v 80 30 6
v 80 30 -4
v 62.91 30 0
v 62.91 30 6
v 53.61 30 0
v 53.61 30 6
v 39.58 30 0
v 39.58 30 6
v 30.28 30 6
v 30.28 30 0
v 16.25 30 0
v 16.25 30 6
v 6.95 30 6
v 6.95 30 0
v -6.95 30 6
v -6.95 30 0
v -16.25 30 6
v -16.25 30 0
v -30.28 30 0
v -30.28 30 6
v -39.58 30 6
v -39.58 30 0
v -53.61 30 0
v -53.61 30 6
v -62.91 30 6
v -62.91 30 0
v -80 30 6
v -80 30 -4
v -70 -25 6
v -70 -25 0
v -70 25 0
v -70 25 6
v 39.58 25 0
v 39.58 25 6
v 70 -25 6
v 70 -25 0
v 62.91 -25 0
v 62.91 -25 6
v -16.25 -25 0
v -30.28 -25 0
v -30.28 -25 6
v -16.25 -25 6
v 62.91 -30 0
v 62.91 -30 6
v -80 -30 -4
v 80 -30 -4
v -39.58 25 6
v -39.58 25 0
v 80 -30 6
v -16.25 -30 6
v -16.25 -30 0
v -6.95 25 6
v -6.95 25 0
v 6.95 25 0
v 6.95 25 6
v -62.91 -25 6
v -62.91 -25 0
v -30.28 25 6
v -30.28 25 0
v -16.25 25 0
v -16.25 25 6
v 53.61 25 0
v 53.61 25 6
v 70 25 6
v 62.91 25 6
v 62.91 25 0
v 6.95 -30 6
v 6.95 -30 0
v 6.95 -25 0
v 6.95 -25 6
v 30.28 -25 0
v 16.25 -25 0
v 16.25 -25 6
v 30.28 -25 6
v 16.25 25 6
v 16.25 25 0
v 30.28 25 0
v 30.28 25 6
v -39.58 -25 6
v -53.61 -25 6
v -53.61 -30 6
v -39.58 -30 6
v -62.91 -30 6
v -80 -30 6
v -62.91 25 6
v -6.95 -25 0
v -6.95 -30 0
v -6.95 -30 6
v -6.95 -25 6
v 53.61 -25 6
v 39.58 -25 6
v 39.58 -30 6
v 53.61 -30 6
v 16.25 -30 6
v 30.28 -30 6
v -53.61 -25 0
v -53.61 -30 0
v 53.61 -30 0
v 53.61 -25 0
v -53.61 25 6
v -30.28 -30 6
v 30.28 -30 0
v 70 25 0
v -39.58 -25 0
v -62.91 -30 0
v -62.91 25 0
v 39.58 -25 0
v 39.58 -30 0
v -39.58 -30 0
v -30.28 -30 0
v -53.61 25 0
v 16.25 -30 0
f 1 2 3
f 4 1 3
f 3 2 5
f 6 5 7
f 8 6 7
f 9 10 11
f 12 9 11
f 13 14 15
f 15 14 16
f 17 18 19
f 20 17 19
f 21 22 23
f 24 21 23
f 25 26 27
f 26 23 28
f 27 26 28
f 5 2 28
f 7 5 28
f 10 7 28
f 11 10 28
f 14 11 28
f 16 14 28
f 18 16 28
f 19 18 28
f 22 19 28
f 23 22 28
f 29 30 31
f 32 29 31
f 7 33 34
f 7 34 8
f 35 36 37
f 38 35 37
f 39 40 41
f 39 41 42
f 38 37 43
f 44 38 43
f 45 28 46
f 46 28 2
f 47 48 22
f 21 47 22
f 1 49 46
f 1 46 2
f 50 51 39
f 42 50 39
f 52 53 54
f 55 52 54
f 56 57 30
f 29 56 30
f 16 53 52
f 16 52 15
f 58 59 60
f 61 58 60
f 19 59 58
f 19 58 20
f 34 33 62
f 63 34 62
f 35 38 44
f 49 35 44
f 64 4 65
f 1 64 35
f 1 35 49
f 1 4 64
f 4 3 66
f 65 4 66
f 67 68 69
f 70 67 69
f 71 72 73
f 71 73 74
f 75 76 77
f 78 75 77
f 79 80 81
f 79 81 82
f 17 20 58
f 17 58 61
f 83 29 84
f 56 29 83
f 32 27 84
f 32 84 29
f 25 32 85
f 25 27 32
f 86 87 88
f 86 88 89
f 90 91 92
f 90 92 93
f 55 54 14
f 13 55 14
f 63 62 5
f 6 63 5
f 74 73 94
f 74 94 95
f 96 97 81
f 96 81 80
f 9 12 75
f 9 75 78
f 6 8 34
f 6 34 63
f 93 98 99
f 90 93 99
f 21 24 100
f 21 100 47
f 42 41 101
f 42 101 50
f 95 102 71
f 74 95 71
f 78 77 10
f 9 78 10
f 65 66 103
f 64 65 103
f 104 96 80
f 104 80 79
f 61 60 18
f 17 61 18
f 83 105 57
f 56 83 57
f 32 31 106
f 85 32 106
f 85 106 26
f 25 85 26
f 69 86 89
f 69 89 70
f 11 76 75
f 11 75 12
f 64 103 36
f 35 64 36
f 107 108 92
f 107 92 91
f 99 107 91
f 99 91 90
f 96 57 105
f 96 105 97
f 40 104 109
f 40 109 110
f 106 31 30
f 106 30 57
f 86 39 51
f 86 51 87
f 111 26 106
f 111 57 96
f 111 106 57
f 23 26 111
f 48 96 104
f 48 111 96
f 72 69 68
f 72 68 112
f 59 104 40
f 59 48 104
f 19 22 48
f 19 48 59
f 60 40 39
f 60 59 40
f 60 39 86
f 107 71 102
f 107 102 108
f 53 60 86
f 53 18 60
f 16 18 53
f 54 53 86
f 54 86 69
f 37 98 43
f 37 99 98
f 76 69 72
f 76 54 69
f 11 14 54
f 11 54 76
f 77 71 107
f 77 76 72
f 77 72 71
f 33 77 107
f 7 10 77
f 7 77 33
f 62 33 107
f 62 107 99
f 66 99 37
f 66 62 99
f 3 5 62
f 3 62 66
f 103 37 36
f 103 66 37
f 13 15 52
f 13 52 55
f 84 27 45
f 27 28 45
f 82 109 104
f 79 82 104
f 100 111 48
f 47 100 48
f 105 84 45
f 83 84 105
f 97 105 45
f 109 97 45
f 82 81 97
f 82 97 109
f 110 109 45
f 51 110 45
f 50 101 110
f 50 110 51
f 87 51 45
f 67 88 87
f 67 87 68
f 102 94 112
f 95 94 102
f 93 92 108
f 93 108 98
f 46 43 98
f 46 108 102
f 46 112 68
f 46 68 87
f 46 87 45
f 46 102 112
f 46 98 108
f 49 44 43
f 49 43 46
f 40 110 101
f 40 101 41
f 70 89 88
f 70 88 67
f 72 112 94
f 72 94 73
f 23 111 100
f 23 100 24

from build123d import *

# Parameters (mm, degrees)
F0_W     = 14.03
F0_H     = 5
F0_W_2   = 13.9
F0_H_2   = 25
F0_W_3   = 9.3
F0_W_4   = 7.09
F0_H_3   = 50
F1_DEPTH = 4
F2_DEPTH = 6


with BuildPart() as f1:
    # F0 (on Top) → F1 (new body)
    with BuildSketch(Plane.XY):
        with Locations((-23.265, 27.5)):
            Rectangle(F0_W, F0_H)
        with Locations((0, -27.5)):
            Rectangle(F0_W_2, F0_H)
        with Locations((46.595, -27.5)):
            Rectangle(F0_W, F0_H)
        Polygon((-62.91, 25), (-62.91, 30), (-80, 30), (-80, -30), (-62.91, -30), (-62.91, -25), (-70, -25), (-70, 25), align=None)
        with Locations((23.265, -12.5)):
            Rectangle(F0_W, F0_H_2)
        with Locations((58.26, -27.5)):
            Rectangle(F0_W_3, F0_H)
        with Locations((34.93, 27.5)):
            Rectangle(F0_W_3, F0_H)
        with Locations((-11.6, -27.5)):
            Rectangle(F0_W_3, F0_H)
        with Locations((-66.455, 0)):
            Rectangle(F0_W_4, F0_H_3)
        with Locations((23.265, 27.5)):
            Rectangle(F0_W, F0_H)
        with Locations((66.455, 0)):
            Rectangle(F0_W_4, F0_H_3)
        with Locations((-58.26, 27.5)):
            Rectangle(F0_W_3, F0_H)
        with Locations((46.595, 27.5)):
            Rectangle(F0_W, F0_H)
        with Locations((-46.595, 27.5)):
            Rectangle(F0_W, F0_H)
        Polygon((80, -30), (80, 30), (62.91, 30), (62.91, 25), (70, 25), (70, -25), (62.91, -25), (62.91, -30), align=None)
        with Locations((-34.93, 27.5)):
            Rectangle(F0_W_3, F0_H)
        with Locations((58.26, 27.5)):
            Rectangle(F0_W_3, F0_H)
        with Locations((11.6, 27.5)):
            Rectangle(F0_W_3, F0_H)
        with Locations((0, 27.5)):
            Rectangle(F0_W_2, F0_H)
        with Locations((-23.265, -27.5)):
            Rectangle(F0_W, F0_H)
        with Locations((-11.6, 27.5)):
            Rectangle(F0_W_3, F0_H)
        with Locations((23.265, -27.5)):
            Rectangle(F0_W, F0_H)
        with Locations((-34.93, -27.5)):
            Rectangle(F0_W_3, F0_H)
        with Locations((-46.595, 0)):
            Rectangle(F0_W, F0_H_3)
        with Locations((23.265, 12.5)):
            Rectangle(F0_W, F0_H_2)
        Polygon((6.95, 0), (6.95, 25), (-6.95, 25), (-6.95, -25), (6.95, -25), align=None)
        with Locations((34.93, -27.5)):
            Rectangle(F0_W_3, F0_H)
        with Locations((-46.595, -27.5)):
            Rectangle(F0_W, F0_H)
        with Locations((46.595, 12.5)):
            Rectangle(F0_W, F0_H_2)
        with Locations((46.595, -12.5)):
            Rectangle(F0_W, F0_H_2)
        with Locations((-58.26, -27.5)):
            Rectangle(F0_W_3, F0_H)
        with Locations((-23.265, 0)):
            Rectangle(F0_W, F0_H_3)
        with Locations((11.6, -27.5)):
            Rectangle(F0_W_3, F0_H)
        with Locations((-58.26, 0)):
            Rectangle(F0_W_3, F0_H_3)
        with Locations((-34.93, 0)):
            Rectangle(F0_W_3, F0_H_3)
        with Locations((-11.6, 0)):
            Rectangle(F0_W_3, F0_H_3)
        Polygon((16.25, -25), (16.25, 0), (11.6, 0), (6.95, 0), (6.95, -25), align=None)
        Polygon((16.25, 0), (16.25, 25), (6.95, 25), (6.95, 0), (11.6, 0), align=None)
        Polygon((39.58, 0), (39.58, 25), (30.28, 25), (30.28, 0), (34.93, 0), align=None)
        Polygon((62.91, -25), (62.91, 25), (53.61, 25), (53.61, 0), (53.61, -25), align=None)
        Polygon((39.58, -25), (39.58, 0), (34.93, 0), (30.28, 0), (30.28, -25), align=None)
    extrude(amount=-F1_DEPTH)

    # F0 (on Top) → F2 (join)
    with BuildSketch(Plane.XY):
        Polygon((-62.91, 25), (-62.91, 30), (-80, 30), (-80, -30), (-62.91, -30), (-62.91, -25), (-70, -25), (-70, 25), align=None)
        with Locations((-46.595, 27.5)):
            Rectangle(F0_W, F0_H)
        with Locations((-46.595, -27.5)):
            Rectangle(F0_W, F0_H)
        with Locations((-23.265, -27.5)):
            Rectangle(F0_W, F0_H)
        with Locations((-23.265, 27.5)):
            Rectangle(F0_W, F0_H)
        with Locations((0, 27.5)):
            Rectangle(F0_W_2, F0_H)
        with Locations((0, -27.5)):
            Rectangle(F0_W_2, F0_H)
        with Locations((23.265, -27.5)):
            Rectangle(F0_W, F0_H)
        with Locations((23.265, 27.5)):
            Rectangle(F0_W, F0_H)
        with Locations((46.595, 27.5)):
            Rectangle(F0_W, F0_H)
        with Locations((46.595, -27.5)):
            Rectangle(F0_W, F0_H)
        Polygon((80, -30), (80, 30), (62.91, 30), (62.91, 25), (70, 25), (70, -25), (62.91, -25), (62.91, -30), align=None)
    extrude(amount=F2_DEPTH)


solid = f1.part
